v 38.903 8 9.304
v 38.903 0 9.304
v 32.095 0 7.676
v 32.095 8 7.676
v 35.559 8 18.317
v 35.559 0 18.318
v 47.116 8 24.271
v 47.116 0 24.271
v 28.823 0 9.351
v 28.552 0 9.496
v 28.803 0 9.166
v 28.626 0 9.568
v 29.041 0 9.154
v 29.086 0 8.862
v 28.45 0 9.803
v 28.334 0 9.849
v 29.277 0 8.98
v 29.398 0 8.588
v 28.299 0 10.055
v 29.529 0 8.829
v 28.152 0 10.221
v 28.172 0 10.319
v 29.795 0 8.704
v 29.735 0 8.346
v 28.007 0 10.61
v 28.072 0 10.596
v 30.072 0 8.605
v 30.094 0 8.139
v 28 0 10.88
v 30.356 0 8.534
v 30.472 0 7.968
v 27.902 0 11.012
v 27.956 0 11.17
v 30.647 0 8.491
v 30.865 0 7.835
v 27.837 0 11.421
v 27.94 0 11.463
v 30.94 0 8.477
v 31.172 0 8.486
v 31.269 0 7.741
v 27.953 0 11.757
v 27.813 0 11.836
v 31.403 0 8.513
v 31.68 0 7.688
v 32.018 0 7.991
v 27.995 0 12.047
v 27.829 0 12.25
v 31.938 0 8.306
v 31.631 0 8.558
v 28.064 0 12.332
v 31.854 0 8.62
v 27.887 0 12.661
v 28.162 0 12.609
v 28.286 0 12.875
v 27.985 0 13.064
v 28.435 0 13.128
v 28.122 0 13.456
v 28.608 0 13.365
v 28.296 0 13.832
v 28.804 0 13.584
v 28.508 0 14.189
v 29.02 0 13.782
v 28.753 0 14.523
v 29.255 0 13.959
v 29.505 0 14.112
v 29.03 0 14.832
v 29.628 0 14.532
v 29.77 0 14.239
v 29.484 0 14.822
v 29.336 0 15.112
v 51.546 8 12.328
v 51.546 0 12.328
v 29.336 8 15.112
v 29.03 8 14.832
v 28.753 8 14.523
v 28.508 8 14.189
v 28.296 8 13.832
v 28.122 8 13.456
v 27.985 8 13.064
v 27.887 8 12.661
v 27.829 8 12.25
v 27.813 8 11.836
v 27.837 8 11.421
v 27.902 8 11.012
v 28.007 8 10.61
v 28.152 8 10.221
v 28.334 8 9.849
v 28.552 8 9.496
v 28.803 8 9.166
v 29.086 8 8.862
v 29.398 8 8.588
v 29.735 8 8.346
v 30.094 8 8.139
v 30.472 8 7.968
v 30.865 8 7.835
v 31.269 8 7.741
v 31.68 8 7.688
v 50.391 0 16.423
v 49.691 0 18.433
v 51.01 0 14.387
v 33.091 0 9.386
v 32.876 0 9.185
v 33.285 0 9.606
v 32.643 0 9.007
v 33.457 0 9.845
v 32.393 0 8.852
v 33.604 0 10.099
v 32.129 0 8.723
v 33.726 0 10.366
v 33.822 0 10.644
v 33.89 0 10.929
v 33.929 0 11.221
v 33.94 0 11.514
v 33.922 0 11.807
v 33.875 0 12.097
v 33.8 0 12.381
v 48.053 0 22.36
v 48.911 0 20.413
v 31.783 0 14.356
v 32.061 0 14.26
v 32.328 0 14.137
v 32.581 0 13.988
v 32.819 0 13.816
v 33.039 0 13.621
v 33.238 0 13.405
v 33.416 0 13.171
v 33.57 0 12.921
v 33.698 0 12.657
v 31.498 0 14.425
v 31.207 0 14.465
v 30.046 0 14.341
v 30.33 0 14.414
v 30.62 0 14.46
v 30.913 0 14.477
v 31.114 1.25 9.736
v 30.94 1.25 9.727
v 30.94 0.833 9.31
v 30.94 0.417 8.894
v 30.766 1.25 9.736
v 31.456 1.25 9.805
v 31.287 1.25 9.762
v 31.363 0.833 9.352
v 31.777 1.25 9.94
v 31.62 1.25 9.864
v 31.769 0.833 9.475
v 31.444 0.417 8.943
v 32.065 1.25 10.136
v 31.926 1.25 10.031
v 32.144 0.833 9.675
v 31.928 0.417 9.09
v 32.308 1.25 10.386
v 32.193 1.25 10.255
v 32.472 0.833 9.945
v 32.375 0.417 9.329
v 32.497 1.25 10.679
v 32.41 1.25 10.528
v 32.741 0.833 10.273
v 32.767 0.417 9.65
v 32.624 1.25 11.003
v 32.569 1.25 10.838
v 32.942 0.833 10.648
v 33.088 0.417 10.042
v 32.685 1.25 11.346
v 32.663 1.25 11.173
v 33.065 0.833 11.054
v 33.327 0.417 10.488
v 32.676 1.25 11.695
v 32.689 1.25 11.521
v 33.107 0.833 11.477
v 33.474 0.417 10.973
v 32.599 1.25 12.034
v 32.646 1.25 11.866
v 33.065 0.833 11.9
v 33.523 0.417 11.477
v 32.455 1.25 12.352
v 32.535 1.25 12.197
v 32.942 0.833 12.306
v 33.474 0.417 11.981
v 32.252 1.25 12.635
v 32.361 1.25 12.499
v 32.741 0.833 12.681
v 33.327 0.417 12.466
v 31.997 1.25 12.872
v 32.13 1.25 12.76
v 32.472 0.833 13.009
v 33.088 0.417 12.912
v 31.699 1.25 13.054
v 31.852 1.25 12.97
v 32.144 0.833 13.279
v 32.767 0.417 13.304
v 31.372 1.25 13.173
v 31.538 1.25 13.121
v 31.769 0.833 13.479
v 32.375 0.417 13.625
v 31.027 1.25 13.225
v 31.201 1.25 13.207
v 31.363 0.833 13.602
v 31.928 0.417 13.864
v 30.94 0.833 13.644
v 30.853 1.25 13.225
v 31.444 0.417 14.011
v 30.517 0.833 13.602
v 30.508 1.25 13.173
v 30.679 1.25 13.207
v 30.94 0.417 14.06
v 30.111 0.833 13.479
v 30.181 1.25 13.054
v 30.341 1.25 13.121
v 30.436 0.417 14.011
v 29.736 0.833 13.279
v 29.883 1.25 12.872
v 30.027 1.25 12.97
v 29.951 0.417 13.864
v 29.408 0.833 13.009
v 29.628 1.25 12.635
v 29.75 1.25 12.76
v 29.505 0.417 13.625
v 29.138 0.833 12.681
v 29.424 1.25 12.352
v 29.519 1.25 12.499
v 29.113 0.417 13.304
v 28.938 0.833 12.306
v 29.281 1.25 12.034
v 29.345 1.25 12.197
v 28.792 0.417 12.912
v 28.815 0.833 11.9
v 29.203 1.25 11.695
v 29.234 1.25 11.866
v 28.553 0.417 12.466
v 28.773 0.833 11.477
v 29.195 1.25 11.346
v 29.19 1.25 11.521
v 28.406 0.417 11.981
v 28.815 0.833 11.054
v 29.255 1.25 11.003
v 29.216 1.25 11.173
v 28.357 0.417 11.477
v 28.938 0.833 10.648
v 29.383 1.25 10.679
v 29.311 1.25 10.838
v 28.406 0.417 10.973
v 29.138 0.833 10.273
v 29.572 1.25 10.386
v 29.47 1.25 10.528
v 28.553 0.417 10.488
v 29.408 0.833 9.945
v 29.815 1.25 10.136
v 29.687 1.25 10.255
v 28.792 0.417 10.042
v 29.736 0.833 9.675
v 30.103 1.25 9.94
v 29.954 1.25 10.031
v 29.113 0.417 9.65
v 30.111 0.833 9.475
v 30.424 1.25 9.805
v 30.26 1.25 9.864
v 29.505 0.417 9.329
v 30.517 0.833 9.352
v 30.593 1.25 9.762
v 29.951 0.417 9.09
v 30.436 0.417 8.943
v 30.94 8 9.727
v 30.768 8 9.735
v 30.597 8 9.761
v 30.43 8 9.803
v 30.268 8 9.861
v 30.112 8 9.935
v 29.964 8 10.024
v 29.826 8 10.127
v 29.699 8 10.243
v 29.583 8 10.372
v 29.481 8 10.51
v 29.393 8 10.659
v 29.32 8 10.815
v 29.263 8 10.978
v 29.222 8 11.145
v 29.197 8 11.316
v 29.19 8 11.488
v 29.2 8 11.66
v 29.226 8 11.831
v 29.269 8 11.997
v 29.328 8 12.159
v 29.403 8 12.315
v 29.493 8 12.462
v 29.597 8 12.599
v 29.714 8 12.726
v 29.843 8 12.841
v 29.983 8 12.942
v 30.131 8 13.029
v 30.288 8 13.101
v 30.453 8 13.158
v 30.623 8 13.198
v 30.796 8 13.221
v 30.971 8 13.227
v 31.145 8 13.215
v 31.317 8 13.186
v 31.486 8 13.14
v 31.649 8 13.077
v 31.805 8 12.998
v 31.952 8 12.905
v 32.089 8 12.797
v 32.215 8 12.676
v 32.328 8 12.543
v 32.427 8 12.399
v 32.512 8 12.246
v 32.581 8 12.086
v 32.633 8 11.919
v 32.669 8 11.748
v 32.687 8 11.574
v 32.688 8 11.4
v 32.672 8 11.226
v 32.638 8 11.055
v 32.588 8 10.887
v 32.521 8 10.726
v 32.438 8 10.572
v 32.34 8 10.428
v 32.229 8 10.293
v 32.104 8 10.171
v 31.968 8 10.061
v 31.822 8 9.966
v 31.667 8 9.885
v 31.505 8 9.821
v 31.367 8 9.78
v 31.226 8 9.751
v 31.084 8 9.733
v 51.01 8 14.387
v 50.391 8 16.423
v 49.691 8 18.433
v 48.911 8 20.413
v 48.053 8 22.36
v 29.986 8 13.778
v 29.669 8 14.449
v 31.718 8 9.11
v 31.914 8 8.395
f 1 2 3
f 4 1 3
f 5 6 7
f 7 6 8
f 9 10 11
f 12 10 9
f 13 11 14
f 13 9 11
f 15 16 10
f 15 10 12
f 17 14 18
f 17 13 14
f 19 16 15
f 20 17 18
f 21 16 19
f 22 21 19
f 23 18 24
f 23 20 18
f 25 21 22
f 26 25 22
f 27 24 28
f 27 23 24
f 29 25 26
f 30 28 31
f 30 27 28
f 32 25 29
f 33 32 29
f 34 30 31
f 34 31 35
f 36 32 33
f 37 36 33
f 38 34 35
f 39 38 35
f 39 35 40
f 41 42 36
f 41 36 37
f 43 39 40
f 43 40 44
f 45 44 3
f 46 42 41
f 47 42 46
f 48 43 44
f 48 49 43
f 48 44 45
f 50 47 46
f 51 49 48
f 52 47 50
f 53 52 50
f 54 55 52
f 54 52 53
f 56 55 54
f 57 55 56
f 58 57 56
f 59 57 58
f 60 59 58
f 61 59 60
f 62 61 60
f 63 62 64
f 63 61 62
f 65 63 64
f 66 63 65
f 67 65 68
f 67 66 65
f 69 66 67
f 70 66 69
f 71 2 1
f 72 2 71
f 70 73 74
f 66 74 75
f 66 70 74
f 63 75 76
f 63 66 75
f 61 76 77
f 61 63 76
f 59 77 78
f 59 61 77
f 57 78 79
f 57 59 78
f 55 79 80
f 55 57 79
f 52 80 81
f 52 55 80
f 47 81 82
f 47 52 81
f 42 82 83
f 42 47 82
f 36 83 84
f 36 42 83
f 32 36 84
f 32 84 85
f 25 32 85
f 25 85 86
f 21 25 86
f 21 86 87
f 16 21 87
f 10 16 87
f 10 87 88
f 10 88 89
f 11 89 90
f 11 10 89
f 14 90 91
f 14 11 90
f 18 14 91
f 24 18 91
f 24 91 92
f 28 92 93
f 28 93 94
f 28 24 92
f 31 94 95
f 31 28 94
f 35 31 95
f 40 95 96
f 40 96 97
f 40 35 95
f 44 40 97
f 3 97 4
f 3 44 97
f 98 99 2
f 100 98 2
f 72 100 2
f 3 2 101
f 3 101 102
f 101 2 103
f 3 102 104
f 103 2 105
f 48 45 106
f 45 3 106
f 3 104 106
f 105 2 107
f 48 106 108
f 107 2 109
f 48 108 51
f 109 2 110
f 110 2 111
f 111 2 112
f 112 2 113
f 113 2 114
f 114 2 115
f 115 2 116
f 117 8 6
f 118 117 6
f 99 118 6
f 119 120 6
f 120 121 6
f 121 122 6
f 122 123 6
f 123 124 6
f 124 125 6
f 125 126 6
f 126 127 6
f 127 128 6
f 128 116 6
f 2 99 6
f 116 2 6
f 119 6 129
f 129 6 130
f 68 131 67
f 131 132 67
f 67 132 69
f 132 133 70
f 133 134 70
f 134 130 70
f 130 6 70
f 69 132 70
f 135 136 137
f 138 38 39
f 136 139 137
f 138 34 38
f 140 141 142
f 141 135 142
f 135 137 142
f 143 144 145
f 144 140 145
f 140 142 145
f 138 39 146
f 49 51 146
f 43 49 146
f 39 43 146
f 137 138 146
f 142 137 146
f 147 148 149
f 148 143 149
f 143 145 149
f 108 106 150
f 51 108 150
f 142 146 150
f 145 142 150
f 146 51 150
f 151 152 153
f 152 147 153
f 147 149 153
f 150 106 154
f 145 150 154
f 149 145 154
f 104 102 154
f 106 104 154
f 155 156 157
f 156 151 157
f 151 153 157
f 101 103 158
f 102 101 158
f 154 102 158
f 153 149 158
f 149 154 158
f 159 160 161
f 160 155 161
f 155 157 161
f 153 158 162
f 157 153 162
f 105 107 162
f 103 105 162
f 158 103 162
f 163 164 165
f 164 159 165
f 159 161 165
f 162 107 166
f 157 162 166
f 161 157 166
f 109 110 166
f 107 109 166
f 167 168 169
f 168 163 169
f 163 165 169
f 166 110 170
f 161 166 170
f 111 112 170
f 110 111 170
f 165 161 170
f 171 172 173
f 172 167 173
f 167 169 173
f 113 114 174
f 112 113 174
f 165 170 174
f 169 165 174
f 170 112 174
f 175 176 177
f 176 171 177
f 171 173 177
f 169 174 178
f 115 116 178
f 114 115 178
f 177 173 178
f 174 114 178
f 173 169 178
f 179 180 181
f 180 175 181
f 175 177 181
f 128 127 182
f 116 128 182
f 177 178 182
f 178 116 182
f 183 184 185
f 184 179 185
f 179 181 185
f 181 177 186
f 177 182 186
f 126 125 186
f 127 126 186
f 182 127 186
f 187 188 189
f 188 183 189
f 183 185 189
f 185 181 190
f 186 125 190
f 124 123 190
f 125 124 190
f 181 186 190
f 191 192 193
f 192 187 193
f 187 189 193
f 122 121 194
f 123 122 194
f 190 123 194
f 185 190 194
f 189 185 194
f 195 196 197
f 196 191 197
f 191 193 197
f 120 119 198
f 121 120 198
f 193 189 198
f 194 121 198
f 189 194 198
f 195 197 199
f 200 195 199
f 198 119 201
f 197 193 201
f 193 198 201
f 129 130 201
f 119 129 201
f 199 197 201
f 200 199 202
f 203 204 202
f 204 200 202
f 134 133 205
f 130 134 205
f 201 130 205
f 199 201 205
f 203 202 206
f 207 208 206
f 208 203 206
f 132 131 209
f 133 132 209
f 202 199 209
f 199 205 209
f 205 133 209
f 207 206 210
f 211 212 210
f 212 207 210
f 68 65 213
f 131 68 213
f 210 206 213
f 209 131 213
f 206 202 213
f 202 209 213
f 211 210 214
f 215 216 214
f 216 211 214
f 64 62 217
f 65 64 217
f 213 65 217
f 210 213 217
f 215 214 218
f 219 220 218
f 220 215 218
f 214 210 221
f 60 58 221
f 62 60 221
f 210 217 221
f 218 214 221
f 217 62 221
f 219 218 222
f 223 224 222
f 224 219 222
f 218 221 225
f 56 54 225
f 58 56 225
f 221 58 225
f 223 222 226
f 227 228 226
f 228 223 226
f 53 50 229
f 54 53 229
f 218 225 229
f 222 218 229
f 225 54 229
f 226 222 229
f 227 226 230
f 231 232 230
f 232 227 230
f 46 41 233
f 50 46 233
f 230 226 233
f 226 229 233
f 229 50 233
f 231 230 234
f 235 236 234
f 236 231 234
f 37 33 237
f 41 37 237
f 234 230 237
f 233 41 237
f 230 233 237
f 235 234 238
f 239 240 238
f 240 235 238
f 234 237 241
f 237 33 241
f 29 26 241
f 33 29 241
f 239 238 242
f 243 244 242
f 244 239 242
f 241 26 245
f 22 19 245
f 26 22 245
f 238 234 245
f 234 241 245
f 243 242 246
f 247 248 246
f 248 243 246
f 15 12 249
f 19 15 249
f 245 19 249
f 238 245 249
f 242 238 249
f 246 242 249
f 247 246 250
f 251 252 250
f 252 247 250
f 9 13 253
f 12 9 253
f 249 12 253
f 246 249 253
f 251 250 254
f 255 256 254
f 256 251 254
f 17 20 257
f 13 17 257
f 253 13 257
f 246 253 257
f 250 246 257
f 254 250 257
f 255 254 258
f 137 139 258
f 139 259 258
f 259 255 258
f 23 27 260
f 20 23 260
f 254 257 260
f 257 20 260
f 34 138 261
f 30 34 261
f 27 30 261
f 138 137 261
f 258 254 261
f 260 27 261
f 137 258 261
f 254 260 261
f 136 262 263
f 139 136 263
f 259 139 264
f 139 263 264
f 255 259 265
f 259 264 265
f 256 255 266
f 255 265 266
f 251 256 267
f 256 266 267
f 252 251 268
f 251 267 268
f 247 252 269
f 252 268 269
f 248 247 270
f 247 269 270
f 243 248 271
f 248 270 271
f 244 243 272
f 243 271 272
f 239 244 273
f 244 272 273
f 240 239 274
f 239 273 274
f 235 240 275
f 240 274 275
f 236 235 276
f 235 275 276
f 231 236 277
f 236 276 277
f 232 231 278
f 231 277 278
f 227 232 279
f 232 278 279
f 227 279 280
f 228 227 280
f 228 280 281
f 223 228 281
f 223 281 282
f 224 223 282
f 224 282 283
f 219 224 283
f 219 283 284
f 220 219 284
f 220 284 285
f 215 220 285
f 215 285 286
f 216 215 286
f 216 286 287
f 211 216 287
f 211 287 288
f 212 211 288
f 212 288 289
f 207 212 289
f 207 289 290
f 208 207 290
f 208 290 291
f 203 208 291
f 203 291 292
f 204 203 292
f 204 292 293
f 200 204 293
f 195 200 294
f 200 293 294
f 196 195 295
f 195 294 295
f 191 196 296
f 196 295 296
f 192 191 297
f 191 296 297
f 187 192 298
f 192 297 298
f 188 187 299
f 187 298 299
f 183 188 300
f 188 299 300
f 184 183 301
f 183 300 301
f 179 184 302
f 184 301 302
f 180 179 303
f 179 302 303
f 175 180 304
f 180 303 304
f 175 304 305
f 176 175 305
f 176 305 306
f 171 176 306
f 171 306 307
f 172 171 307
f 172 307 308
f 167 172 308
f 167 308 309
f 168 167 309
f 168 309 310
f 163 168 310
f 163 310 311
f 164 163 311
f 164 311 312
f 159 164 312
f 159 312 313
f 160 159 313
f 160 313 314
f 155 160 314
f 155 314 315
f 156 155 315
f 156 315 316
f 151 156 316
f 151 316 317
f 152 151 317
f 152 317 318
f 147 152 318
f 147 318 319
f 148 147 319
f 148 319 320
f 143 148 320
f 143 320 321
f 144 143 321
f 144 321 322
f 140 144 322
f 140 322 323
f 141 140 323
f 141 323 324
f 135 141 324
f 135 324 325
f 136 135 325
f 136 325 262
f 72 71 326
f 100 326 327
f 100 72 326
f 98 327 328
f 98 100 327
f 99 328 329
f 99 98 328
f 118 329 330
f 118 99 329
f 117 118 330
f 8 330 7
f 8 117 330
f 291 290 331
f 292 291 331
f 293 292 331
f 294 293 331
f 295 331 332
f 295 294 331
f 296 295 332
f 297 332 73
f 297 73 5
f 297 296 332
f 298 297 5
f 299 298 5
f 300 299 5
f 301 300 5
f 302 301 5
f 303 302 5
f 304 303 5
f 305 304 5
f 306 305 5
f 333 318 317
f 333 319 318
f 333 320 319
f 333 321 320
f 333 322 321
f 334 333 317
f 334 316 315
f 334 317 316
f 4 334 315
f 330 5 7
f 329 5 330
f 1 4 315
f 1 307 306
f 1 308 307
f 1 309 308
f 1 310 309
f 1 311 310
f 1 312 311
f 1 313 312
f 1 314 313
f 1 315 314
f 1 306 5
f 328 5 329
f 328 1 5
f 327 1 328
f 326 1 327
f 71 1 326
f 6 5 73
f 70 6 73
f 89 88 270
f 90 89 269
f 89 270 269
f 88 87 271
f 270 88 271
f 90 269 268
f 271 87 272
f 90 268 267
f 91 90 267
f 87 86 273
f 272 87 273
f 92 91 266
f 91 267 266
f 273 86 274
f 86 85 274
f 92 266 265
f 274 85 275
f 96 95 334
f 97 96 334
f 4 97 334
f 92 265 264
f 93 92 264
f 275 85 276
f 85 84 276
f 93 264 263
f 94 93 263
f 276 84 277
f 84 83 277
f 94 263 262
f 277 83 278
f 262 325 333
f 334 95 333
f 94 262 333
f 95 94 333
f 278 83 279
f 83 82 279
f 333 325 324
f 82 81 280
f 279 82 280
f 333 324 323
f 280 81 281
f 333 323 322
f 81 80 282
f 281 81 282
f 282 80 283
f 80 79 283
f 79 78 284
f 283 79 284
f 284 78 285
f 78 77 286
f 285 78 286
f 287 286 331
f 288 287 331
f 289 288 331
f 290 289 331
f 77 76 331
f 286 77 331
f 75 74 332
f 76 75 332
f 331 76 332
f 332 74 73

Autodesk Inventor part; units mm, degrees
ref_plane "YZ Plane" through (0, 0, 0) normal (1, 0, 0) x (0, 1, 0)
ref_plane "XZ Plane" through (0, 0, 0) normal (0, 1, 0) x (-1, 0, 0)
ref_plane "XY Plane" through (0, 0, 0) normal (0, 0, 1) x (1, 0, 0)
sketch "Sketch1" plane through (0, 0, 0) normal (0, 1, 0) x (-1, 0, 0)
  arc A0 (-33, 0) -> (-32.0949, 7.6757) centre (0, 0) ccw
  arc A1 (-40, 0) -> (-38.9029, 9.3039) centre (0, 0) ccw
  arc A2 (-53, 0) -> (-51.5464, 12.3276) centre (0, 0) ccw
  line L0 (-85, 0) -> (100, 0) construction
  line L1 (-226, 10) -> (0, 10) construction
  line L2 (0, 10) -> (0, -10) construction
  line L3 (0, -10) -> (-226, -10) construction
  line L4 (-226, -10) -> (-226, 10) construction
  line L5 (-226, 10) -> (0, -10) construction
  line L6 (0, 10) -> (-226, -10) construction
  line L7 (-52.0481, -10) -> (-44.1646, -51.032)
  line L8 (-38.9029, 9.3039) -> (-32.0949, 7.6757)
  line L9 (-52.0481, -10) -> (-84.6485, -16.2635)
  circle A3 centre (0, 0) radius 33 construction
  line L10 (0, 0) -> (-30.9399, 11.477) construction
  line L11 (-35.5594, 18.3175) -> (-29.3365, 15.1119)
  line L12 (-19.4128, 10) -> (0, 0)
  line L13 (0, 0) -> (-30.5202, 7.2991)
  line L14 (-32.0949, 7.6757) -> (-148.5747, 35.5325)
  line L15 (-35.5594, 18.3175) -> (-47.1162, 24.2707)
  point P0 (-113, 0)
  point P1 (-113, 0)
  point P2 (-45.9257, 26.4544)
  dimension "d13" = 66
  dimension "d0" = 66
  dimension "d1" = 80
  dimension "d2" = 106
  dimension "d3" = 20
  dimension "d5" = 100.876
  dimension "d11" = 90
  dimension "d12" = 10.876
extrude "Extrusion1" add sketch "Sketch1" along normal blind 10
sketch "Sketch3" plane through (0, 10, 0) normal (0, 1, 0) x (1, 0, 0)
  line L0 (29.3365, -15.1119) -> (47.1162, -24.2707) projected
  arc A0 (29.3365, -15.1119) -> (32.0949, -7.6757) centre (0, 0) ccw projected
  line L1 (51.5464, -12.3276) -> (32.0949, -7.6757) projected
  arc A1 (47.1162, -24.2707) -> (51.5464, -12.3276) centre (0, 0) ccw projected
  arc A2 (40, 0) -> (38.9029, -9.3039) centre (0, 0) ccw projected
  point P0 (35.5594, -18.3175)
extrude "Extrusion3" cut sketch "Sketch3" against normal blind 2
ref_plane "Work Plane1" through (30.9399, 0, 11.477) normal (0, -1, 0) x (-0.3478, 0, 0.9376)
sketch "Sketch5" plane through (0, 0, 0) normal (0, -1, 0) x (1, 0, 0)
  arc A0 (32.0949, 7.6757) -> (29.3365, 15.1119) centre (0, 0) ccw projected
  arc A1 (29.3365, 15.1119) -> (32.0949, 7.6757) centre (32.0126, 11.8749) ccw
  dimension "d38" = 4.2
extrude "Extrusion5" add sketch "Sketch5" against normal up to surface (8 mm away)
hole "Hole3" at (30.9399, 0, 11.477) direction (0, 1, 0) diameter 3.5 depth 8 tip angle 118 countersink diameter 6 countersink angle 90
equation "\"d13\" = d0"
equation "\"d15\" = 0.5 * d14"
properties part number "end_stop_plug_v3"
